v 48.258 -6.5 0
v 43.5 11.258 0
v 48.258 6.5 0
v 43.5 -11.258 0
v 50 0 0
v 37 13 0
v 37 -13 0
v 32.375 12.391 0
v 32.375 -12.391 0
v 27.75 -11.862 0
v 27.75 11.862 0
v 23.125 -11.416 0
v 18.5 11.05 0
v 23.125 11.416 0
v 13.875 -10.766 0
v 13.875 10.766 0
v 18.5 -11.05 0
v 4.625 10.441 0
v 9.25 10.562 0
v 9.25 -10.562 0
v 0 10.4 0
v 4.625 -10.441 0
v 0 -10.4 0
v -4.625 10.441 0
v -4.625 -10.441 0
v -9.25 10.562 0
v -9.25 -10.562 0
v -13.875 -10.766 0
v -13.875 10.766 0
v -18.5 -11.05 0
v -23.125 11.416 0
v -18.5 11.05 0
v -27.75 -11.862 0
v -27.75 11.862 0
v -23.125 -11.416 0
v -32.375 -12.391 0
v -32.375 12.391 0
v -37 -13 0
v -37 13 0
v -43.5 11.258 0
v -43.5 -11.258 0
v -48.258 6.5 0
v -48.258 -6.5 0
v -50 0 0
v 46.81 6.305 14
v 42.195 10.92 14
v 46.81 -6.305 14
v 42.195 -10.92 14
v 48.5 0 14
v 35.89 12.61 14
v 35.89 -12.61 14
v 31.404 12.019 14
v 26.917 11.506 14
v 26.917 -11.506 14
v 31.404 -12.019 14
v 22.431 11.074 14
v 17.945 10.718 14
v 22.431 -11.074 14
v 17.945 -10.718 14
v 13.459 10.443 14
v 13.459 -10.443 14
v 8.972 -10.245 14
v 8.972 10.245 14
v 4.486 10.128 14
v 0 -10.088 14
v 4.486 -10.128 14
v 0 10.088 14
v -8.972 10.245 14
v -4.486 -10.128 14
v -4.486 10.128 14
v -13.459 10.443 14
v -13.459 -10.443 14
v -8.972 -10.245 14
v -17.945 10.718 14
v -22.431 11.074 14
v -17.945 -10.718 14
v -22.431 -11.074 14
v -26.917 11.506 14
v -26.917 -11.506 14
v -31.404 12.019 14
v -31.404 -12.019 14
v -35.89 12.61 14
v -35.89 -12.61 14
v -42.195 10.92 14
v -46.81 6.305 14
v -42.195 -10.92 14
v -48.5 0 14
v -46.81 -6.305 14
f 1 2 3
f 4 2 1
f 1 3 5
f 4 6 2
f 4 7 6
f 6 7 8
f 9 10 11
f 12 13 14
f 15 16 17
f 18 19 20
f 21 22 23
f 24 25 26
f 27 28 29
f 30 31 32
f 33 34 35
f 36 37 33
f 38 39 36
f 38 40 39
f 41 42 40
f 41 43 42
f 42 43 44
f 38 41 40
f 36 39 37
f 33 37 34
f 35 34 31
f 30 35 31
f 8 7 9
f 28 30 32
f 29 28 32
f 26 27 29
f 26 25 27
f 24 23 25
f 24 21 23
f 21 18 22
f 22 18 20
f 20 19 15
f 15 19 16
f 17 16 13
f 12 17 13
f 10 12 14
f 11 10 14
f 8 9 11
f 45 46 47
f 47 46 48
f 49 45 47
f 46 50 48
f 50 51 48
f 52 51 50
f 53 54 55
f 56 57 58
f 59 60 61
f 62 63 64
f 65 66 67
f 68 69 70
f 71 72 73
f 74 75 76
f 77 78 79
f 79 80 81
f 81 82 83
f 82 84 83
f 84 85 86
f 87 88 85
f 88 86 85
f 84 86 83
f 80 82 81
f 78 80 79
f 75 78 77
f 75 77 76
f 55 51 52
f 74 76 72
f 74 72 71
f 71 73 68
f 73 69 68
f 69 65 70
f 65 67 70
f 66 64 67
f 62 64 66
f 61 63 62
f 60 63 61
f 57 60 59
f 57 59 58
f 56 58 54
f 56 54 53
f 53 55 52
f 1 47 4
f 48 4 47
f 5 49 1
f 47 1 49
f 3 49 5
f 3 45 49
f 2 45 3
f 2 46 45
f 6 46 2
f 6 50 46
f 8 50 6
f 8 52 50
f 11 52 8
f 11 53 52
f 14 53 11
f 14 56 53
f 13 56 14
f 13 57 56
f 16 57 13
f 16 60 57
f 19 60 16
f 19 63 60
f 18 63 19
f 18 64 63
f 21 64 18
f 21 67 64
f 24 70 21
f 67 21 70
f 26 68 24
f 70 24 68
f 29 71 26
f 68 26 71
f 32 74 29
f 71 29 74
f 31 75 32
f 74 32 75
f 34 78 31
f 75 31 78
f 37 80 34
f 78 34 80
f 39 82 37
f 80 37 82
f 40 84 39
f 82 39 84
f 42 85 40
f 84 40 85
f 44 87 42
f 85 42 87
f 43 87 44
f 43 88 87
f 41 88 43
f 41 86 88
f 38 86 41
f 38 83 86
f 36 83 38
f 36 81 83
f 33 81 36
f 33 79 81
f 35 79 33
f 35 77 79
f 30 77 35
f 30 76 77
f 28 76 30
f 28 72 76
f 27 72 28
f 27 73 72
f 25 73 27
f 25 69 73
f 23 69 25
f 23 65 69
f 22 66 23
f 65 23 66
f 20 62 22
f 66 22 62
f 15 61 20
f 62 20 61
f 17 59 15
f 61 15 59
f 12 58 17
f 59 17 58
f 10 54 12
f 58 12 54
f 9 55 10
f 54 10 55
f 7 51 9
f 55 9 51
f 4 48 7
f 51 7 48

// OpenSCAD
$fn = 32;

// ----------------------------------------------------------------------
// Handle: 100 x 26 mm grip, 14 mm thick
// ----------------------------------------------------------------------

// --- parameters (mm) ---
length = 100;             // grip length
width = 26;               // grip width
thickness = 14;           // grip thickness
waist = 0.8;              // width factor at the middle
draft = 0.97;             // top face scale of the extrusion

/* ergonomic grip outline, closed spline-like polygon in the XY plane */
grip = [[-37, 13], [-32.375, 12.391], [-27.75, 11.862], [-23.125, 11.416], [-18.5, 11.05], [-13.875, 10.766], [-9.25, 10.562], [-4.625, 10.441], [0, 10.4], [4.625, 10.441], [9.25, 10.562], [13.875, 10.766], [18.5, 11.05], [23.125, 11.416], [27.75, 11.862], [32.375, 12.391], [37, 13], [43.5, 11.258], [48.258, 6.5], [50, 0], [48.258, -6.5], [43.5, -11.258], [37, -13], [37, -13], [32.375, -12.391], [27.75, -11.862], [23.125, -11.416], [18.5, -11.05], [13.875, -10.766], [9.25, -10.562], [4.625, -10.441], [0, -10.4], [-4.625, -10.441], [-9.25, -10.562], [-13.875, -10.766], [-18.5, -11.05], [-23.125, -11.416], [-27.75, -11.862], [-32.375, -12.391], [-37, -13], [-43.5, -11.258], [-48.258, -6.5], [-50, 0], [-48.258, 6.5], [-43.5, 11.258], [-37, 13]];

module grip_body() {
  linear_extrude(height = thickness, scale = draft) polygon(grip);
}

difference() {
  union() {
    grip_body();
  }
}
